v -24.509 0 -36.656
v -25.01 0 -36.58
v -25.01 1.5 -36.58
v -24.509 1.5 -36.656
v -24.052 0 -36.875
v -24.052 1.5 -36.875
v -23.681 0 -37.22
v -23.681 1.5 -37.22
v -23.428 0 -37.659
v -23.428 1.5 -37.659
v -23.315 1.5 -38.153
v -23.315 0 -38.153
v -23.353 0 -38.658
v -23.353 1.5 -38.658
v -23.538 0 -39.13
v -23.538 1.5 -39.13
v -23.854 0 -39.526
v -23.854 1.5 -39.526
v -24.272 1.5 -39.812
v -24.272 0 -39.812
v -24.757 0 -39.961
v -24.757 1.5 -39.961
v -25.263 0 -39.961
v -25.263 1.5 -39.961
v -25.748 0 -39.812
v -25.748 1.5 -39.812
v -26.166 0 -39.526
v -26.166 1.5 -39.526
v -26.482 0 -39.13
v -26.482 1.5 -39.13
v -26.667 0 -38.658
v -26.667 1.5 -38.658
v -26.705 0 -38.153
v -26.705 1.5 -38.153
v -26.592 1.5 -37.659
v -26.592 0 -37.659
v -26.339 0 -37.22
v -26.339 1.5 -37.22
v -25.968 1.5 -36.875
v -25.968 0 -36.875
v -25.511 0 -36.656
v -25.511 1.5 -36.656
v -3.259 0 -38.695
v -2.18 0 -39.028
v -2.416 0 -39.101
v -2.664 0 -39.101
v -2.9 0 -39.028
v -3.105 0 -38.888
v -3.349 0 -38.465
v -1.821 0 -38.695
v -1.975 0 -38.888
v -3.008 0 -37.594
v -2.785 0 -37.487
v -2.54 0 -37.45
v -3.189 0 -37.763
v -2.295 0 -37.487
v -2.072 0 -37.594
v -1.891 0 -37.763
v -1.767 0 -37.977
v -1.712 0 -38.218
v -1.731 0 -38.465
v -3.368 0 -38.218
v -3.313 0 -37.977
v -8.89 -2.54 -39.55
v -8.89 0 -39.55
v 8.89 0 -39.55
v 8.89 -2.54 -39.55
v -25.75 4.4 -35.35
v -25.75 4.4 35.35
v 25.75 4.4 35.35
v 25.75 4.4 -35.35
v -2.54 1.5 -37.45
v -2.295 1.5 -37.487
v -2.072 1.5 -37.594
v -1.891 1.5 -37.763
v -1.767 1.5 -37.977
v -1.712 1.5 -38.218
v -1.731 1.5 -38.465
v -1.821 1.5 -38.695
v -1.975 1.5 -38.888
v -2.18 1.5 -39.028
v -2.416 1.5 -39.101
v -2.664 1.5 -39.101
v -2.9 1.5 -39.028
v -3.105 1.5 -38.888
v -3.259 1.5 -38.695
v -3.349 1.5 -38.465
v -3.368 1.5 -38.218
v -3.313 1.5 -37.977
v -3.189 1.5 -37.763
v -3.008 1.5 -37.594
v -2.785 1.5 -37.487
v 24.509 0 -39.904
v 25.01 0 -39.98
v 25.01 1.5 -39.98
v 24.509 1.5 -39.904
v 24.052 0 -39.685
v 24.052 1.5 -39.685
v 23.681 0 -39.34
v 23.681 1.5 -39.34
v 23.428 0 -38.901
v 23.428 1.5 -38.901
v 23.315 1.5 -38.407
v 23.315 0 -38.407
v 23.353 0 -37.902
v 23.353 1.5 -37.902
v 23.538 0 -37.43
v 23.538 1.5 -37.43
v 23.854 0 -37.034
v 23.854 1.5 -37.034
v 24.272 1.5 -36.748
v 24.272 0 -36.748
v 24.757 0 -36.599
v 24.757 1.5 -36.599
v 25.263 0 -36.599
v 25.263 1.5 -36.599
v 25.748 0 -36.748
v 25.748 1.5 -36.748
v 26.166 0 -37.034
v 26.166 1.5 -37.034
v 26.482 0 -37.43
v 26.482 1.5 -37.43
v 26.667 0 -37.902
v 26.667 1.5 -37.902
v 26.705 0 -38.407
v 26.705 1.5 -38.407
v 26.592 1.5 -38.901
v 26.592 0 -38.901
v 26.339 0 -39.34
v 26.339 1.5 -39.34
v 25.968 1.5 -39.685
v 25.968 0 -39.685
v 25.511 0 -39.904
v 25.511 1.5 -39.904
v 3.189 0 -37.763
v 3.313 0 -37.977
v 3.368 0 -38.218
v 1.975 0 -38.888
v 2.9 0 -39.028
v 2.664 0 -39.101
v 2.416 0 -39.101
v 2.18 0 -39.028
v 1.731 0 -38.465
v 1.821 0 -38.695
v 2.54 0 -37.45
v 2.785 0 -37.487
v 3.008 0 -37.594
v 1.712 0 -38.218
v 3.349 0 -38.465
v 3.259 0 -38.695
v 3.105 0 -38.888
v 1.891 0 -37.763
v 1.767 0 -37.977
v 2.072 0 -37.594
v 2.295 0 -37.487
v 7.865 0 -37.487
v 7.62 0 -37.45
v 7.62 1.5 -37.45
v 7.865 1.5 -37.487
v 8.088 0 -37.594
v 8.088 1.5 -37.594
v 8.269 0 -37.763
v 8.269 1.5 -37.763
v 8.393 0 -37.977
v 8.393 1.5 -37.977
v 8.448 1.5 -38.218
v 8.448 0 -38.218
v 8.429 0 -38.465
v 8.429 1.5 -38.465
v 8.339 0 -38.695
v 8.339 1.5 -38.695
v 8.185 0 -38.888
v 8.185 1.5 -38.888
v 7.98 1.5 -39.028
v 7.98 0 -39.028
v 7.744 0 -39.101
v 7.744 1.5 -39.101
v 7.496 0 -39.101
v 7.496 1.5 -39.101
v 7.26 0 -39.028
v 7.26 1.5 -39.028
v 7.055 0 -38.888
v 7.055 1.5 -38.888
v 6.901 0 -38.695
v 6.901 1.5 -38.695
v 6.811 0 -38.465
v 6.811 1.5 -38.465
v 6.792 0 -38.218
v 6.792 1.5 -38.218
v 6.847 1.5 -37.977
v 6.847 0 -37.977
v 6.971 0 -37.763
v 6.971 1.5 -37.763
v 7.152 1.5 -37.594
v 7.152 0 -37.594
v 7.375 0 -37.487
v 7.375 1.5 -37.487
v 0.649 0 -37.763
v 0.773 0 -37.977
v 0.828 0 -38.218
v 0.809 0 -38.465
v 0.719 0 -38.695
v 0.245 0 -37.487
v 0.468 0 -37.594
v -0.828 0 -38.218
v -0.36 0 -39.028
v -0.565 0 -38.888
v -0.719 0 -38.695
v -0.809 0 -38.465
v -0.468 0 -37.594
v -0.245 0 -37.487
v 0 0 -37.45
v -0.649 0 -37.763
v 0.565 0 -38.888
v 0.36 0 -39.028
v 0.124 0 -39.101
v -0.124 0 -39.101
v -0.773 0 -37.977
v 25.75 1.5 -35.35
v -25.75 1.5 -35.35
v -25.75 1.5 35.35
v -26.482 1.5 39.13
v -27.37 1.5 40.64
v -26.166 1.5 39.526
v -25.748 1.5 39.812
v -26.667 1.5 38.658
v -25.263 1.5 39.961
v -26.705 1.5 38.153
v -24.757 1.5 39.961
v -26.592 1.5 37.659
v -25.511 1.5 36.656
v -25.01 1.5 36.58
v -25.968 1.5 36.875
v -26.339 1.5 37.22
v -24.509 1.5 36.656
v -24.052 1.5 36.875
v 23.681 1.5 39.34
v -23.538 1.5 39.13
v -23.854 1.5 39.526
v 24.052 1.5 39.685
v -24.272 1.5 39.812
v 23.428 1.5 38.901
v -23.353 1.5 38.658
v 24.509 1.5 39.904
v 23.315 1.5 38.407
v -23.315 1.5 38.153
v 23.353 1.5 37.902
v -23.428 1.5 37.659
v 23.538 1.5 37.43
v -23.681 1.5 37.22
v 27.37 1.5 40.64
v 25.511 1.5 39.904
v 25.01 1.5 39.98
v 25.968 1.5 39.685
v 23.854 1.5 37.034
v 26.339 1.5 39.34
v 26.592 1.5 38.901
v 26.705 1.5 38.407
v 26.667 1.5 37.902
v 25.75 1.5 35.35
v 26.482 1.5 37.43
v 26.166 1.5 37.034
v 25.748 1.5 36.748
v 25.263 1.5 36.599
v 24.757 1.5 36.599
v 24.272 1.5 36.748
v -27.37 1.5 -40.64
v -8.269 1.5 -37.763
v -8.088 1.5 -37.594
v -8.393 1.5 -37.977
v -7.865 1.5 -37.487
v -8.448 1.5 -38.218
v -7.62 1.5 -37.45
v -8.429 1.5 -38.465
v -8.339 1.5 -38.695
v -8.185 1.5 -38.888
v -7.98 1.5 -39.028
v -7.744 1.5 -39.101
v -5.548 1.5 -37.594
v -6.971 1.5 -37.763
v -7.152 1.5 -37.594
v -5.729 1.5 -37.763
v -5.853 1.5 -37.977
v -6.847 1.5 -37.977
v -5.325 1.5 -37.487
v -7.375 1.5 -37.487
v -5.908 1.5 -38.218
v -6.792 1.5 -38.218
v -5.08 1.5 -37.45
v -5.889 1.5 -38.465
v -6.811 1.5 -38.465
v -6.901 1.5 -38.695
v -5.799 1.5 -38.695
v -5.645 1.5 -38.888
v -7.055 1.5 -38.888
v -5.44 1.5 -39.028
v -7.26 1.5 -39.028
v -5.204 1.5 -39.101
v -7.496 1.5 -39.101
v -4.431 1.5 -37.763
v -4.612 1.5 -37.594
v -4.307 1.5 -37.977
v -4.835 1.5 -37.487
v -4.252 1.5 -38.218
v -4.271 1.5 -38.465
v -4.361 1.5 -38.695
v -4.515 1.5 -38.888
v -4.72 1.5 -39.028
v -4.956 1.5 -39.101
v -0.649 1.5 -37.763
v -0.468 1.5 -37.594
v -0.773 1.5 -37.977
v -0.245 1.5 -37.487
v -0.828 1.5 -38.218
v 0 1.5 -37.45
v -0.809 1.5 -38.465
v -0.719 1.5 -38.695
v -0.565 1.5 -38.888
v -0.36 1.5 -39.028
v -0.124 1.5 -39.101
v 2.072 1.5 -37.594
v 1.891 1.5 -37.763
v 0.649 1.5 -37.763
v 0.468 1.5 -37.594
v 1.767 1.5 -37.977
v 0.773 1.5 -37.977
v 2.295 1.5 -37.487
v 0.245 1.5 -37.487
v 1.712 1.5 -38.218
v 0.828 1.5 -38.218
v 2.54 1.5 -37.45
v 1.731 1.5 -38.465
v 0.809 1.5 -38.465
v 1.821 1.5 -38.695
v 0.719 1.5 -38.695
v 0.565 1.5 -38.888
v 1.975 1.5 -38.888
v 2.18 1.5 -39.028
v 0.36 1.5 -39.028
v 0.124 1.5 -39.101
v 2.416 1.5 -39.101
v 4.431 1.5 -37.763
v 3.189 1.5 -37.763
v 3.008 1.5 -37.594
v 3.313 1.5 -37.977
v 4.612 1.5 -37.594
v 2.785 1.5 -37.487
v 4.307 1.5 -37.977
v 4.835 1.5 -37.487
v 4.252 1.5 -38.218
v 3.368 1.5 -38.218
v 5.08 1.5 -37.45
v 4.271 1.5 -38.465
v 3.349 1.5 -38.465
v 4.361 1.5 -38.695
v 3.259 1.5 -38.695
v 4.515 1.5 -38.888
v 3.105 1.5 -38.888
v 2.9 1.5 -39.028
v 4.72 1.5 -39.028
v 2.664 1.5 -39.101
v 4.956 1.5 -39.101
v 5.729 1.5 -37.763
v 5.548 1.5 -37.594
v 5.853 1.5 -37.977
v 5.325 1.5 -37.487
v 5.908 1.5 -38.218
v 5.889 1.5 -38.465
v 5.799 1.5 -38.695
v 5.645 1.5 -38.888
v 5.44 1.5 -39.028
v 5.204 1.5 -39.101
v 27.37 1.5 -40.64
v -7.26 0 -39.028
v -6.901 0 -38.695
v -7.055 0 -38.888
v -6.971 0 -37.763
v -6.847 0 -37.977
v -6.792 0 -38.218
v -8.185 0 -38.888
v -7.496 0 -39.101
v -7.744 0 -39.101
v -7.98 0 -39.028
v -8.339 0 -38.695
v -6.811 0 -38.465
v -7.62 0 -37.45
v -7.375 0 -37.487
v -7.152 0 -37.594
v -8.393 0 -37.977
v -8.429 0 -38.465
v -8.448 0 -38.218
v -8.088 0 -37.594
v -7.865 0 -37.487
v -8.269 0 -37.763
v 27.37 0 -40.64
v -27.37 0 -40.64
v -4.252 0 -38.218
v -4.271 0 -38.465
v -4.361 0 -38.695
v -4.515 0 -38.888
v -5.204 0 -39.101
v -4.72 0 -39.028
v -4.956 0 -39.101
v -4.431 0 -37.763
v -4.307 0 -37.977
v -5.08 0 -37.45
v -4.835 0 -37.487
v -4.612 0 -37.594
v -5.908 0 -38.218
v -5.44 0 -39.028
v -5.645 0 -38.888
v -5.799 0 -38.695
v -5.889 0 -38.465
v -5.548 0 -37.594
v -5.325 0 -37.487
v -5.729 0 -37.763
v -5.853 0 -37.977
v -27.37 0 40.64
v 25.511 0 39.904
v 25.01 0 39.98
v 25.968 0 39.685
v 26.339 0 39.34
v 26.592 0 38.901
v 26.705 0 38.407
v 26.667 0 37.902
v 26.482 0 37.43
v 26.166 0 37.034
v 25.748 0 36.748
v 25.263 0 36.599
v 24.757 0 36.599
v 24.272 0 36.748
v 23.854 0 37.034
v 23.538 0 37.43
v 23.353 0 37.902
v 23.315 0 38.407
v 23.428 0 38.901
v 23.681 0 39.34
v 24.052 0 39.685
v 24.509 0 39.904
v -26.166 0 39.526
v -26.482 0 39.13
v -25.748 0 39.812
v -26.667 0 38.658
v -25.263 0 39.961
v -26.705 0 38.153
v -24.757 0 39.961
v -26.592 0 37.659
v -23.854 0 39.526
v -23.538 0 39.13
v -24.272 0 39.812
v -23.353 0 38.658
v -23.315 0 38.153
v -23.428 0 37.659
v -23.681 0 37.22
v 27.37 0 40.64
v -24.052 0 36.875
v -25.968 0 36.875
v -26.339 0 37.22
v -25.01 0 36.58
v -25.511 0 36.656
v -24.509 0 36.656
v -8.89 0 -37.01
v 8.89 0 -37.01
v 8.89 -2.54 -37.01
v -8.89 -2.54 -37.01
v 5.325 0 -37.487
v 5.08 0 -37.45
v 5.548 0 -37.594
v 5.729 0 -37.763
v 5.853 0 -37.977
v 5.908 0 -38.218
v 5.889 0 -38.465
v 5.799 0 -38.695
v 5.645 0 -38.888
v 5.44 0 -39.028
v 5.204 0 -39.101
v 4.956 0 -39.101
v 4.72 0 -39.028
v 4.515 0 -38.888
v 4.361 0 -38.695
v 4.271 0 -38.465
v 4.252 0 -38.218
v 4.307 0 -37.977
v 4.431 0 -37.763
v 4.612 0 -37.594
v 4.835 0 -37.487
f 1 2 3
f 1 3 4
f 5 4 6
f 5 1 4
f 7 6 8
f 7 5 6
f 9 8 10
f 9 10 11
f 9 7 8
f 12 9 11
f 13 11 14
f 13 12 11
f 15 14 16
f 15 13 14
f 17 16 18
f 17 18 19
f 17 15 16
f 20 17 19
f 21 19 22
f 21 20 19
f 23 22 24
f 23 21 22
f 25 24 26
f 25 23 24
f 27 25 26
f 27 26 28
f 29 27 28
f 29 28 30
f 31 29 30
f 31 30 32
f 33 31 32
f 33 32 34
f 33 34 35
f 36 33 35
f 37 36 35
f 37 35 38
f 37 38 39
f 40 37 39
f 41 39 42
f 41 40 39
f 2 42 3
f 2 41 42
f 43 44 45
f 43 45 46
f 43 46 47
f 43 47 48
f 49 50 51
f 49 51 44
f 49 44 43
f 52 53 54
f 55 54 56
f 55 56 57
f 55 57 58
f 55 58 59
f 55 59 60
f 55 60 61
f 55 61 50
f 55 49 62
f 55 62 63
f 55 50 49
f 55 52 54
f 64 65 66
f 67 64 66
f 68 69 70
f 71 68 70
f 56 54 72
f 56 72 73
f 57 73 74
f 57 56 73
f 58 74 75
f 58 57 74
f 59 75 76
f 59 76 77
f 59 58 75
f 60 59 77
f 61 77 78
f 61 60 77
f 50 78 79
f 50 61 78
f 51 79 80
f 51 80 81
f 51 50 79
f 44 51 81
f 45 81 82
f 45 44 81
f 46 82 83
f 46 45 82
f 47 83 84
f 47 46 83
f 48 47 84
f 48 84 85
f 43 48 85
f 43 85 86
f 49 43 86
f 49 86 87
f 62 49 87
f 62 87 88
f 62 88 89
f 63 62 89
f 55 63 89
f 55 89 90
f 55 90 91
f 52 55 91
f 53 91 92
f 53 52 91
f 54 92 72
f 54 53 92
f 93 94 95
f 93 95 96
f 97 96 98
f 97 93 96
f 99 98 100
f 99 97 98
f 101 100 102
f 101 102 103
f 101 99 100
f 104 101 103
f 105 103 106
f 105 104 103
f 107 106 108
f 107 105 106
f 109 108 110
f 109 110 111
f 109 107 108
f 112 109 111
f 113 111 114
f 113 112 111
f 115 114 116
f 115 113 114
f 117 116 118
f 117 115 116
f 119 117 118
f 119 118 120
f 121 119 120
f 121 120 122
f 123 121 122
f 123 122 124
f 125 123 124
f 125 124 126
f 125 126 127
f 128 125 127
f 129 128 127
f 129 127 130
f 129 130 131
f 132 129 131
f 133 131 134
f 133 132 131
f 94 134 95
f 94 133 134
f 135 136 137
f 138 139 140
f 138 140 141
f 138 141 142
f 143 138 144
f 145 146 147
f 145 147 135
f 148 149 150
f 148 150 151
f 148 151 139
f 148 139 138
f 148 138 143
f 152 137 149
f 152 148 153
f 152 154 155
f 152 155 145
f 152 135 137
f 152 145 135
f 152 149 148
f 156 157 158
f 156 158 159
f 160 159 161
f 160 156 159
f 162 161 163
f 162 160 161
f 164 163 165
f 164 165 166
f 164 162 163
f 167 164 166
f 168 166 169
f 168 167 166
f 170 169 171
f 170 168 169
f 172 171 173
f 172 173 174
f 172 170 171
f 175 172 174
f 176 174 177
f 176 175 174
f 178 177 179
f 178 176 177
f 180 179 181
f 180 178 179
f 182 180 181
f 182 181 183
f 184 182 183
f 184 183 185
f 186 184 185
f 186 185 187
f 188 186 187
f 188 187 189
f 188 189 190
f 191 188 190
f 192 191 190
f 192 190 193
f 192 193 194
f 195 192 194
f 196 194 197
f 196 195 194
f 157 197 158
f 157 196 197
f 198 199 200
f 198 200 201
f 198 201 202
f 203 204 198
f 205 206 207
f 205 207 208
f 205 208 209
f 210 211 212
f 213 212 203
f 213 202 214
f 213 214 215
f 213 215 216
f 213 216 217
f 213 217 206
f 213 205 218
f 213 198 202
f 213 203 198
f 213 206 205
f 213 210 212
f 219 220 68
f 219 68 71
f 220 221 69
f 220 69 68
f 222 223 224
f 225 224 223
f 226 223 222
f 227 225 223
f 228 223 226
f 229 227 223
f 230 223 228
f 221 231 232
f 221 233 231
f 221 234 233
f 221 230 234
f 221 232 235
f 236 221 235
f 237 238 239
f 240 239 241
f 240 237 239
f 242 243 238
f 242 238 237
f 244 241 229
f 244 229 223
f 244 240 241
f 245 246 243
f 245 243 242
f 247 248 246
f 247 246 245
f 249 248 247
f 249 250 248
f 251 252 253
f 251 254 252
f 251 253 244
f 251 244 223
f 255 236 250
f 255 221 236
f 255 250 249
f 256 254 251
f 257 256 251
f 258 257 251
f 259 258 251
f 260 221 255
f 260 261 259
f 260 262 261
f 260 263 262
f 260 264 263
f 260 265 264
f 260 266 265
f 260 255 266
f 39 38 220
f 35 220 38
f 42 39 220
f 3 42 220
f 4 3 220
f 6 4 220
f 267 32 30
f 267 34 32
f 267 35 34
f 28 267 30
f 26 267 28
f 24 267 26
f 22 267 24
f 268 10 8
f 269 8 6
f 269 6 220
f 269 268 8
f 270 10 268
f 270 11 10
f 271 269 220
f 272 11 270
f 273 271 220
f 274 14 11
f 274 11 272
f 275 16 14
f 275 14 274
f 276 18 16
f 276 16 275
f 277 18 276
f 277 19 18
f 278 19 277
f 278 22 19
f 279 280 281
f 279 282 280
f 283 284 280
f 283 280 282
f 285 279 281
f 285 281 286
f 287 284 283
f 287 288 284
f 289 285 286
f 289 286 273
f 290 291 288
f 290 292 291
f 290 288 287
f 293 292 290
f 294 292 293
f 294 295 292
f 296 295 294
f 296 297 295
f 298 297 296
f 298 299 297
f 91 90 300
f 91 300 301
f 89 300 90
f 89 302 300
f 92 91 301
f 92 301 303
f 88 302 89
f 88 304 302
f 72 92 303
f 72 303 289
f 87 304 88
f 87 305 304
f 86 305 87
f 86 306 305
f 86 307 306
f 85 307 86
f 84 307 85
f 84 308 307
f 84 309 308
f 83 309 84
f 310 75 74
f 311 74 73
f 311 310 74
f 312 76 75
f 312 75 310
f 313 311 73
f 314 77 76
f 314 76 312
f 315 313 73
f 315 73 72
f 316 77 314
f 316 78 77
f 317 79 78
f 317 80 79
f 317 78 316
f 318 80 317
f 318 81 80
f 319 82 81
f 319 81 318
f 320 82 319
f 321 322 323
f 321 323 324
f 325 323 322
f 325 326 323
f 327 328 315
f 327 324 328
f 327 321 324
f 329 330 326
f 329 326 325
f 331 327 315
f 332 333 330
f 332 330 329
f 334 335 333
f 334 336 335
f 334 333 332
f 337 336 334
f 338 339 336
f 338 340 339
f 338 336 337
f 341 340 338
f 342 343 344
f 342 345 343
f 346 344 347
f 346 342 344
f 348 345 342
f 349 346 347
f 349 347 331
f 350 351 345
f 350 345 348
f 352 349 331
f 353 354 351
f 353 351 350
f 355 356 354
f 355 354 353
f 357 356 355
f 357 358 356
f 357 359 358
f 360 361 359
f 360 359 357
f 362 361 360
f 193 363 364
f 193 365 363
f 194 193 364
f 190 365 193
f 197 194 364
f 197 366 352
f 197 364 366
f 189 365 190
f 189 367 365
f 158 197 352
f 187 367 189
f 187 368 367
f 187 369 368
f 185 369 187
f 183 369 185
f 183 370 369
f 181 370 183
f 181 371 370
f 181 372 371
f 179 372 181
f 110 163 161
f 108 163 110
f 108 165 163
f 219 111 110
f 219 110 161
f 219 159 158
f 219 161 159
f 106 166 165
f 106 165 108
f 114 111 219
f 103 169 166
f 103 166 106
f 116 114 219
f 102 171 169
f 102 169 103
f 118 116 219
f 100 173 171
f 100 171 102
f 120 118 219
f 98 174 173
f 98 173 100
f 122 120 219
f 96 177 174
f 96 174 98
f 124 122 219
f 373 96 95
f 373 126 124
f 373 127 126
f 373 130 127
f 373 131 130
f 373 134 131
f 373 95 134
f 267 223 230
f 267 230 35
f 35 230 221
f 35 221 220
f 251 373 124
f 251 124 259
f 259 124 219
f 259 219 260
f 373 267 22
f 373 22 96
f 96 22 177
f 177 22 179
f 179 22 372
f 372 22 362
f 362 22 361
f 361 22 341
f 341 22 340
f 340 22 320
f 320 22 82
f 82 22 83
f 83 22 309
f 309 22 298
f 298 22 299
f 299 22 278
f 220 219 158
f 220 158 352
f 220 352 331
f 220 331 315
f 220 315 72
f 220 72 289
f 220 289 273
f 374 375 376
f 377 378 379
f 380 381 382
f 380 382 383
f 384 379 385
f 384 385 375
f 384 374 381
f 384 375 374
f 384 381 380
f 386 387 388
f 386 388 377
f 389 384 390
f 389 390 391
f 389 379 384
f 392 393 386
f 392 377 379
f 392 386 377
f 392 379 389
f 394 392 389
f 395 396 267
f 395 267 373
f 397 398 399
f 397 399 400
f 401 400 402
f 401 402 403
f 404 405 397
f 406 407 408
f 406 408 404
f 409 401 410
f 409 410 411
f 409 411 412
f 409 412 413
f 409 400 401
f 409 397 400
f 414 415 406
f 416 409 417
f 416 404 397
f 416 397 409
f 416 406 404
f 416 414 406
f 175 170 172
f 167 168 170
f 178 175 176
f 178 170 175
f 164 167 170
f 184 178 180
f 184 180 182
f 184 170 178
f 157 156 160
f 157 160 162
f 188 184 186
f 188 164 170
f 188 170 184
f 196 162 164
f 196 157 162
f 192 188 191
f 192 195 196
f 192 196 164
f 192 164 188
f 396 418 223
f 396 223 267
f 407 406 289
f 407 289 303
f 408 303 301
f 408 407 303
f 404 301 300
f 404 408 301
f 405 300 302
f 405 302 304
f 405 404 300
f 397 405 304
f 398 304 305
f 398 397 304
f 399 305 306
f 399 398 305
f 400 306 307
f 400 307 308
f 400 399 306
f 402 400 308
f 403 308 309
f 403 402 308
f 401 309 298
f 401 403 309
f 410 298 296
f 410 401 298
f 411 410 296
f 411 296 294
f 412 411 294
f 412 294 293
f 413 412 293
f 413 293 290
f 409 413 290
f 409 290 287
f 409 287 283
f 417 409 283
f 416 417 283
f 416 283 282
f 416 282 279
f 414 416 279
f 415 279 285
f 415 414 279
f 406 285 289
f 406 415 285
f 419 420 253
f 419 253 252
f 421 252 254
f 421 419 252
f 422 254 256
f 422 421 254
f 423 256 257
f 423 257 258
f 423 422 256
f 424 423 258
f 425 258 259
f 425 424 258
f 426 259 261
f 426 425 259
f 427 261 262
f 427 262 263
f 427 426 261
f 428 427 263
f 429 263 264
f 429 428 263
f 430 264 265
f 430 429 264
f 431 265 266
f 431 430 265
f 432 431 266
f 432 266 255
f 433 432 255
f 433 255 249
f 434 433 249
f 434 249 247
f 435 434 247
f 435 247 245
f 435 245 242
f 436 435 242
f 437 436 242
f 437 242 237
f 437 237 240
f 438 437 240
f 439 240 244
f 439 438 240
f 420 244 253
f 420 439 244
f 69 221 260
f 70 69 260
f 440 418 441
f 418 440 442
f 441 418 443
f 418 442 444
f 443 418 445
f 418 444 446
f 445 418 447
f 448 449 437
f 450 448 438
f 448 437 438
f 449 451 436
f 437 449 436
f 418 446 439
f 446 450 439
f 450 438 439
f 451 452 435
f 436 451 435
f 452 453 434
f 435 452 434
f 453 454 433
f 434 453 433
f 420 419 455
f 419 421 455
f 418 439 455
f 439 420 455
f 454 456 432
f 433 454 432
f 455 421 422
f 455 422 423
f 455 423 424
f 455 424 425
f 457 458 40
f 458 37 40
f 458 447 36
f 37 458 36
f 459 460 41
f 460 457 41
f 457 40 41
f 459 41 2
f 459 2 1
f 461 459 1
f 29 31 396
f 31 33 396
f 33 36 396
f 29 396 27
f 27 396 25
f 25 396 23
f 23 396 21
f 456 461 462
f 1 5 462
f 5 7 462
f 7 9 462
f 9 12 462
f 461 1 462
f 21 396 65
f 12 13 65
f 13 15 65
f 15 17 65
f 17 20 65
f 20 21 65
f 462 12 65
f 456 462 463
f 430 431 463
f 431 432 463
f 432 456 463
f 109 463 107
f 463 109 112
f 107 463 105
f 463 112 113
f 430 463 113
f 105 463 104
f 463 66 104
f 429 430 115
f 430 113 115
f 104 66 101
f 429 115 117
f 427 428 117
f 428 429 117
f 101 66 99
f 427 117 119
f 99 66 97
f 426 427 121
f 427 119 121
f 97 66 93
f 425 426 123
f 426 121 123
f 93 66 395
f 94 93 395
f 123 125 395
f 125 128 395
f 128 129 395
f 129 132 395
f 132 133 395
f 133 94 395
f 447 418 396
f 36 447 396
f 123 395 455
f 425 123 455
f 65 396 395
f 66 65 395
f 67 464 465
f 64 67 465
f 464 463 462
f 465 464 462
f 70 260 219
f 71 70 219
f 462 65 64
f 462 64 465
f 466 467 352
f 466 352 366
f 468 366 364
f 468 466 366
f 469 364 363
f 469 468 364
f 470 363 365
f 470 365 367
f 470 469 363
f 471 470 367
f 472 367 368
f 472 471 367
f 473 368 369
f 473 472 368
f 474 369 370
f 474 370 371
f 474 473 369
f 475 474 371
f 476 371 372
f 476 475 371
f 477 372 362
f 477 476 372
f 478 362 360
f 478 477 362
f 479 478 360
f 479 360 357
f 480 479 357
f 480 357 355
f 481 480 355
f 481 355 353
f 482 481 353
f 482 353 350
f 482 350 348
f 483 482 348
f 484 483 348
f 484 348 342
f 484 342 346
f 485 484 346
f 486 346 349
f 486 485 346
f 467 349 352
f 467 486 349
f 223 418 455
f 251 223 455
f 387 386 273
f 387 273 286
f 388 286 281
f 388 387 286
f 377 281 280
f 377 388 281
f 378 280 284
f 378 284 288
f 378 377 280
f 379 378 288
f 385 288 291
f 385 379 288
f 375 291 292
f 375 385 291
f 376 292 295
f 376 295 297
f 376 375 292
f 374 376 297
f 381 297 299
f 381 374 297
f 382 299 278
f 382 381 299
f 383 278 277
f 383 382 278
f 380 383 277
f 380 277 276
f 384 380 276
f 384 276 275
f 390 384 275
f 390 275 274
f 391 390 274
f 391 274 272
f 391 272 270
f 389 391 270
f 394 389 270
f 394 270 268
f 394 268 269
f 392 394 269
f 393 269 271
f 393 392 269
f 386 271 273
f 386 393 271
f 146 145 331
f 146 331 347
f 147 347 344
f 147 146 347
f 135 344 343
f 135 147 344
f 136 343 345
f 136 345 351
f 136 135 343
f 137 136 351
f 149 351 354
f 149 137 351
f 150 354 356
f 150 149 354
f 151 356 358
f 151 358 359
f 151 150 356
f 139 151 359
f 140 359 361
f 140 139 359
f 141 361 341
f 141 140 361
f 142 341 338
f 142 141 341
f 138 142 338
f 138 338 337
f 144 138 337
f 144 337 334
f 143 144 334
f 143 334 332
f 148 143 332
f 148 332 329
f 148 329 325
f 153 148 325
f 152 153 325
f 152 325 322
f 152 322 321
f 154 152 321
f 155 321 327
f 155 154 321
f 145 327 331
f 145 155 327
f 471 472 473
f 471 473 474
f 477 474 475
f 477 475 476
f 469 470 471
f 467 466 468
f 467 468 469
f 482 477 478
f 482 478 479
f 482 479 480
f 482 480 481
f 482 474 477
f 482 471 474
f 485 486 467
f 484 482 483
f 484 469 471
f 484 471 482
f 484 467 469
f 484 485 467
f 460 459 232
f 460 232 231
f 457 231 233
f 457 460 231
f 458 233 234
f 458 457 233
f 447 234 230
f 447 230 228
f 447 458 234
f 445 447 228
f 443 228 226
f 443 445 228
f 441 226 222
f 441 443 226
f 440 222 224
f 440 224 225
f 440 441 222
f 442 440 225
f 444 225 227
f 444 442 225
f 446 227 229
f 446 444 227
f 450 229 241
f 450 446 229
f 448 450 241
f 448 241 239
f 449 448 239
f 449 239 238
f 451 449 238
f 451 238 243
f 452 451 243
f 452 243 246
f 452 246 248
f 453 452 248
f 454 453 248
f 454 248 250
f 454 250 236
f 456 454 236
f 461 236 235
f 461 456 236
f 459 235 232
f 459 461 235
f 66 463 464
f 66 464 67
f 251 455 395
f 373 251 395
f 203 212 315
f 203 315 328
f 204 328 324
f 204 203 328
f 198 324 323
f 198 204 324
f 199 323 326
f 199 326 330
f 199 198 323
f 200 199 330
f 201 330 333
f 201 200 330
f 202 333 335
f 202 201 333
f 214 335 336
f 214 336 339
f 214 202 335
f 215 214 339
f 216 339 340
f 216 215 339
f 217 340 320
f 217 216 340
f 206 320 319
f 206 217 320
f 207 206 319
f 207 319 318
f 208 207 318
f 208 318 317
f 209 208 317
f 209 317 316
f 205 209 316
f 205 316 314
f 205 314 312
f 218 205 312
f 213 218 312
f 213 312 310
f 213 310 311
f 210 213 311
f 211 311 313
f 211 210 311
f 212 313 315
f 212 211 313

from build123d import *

# Parameters (mm, degrees)
SKETCH1_W           = 54.74
SKETCH1_H           = 81.28
SKETCH1_R           = 1.7
SKETCH1_R_2         = 0.83
BOSS_EXTRUDE1_DEPTH = 1.5
SKETCH2_W           = 51.5
SKETCH2_H           = 70.7
BOSS_EXTRUDE2_DEPTH = 2.9
BOSS_EXTRUDE3_DEPTH = 2.54


with BuildPart() as part:
    # Sketch1 → Boss-Extrude1 (new body)
    with BuildSketch(Plane(origin=(0, 0, 0), x_dir=(1, 0, 0), z_dir=(0, 1, 0))):
        Rectangle(SKETCH1_W, SKETCH1_H)
        with Locations(Location((-25.01, 38.28, 0), (0, 0, 270))):
            Circle(SKETCH1_R, mode=Mode.SUBTRACT)
        with Locations(Location((25.01, 38.28, 0), (0, 0, 90))):
            Circle(SKETCH1_R, mode=Mode.SUBTRACT)
        with Locations(Location((-25.01, -38.28, 0), (0, 0, 90))):
            Circle(SKETCH1_R, mode=Mode.SUBTRACT)
        with Locations(Location((25.01, -38.28, 0), (0, 0, 270))):
            Circle(SKETCH1_R, mode=Mode.SUBTRACT)
        with Locations(Location((0, 38.28, 0), (0, 0, 270))):
            Circle(SKETCH1_R_2, mode=Mode.SUBTRACT)
        with Locations(Location((2.54, 38.28, 0), (0, 0, 270))):
            Circle(SKETCH1_R_2, mode=Mode.SUBTRACT)
        with Locations(Location((5.08, 38.28, 0), (0, 0, 270))):
            Circle(SKETCH1_R_2, mode=Mode.SUBTRACT)
        with Locations(Location((7.62, 38.28, 0), (0, 0, 270))):
            Circle(SKETCH1_R_2, mode=Mode.SUBTRACT)
        with Locations(Location((-2.54, 38.28, 0), (0, 0, 270))):
            Circle(SKETCH1_R_2, mode=Mode.SUBTRACT)
        with Locations(Location((-5.08, 38.28, 0), (0, 0, 270))):
            Circle(SKETCH1_R_2, mode=Mode.SUBTRACT)
        with Locations(Location((-7.62, 38.28, 0), (0, 0, 270))):
            Circle(SKETCH1_R_2, mode=Mode.SUBTRACT)
    extrude(amount=BOSS_EXTRUDE1_DEPTH)

    # Sketch2 → Boss-Extrude2 (add)
    with BuildSketch(Plane(origin=(0, 1.5, 0), x_dir=(1, 0, 0), z_dir=(0, 1, 0))):
        Rectangle(SKETCH2_W, SKETCH2_H)
    extrude(amount=BOSS_EXTRUDE2_DEPTH)

    # Sketch3 → Boss-Extrude3 (add)
    with BuildSketch(Plane.XZ):
        Polygon((-6.35, -37.01), (6.35, -37.01), (8.89, -37.01), (8.89, -39.55), (6.35, -39.55), (-6.35, -39.55), (-8.89, -39.55), (-8.89, -37.01), align=None)
    extrude(amount=BOSS_EXTRUDE3_DEPTH)


solid = part.part
